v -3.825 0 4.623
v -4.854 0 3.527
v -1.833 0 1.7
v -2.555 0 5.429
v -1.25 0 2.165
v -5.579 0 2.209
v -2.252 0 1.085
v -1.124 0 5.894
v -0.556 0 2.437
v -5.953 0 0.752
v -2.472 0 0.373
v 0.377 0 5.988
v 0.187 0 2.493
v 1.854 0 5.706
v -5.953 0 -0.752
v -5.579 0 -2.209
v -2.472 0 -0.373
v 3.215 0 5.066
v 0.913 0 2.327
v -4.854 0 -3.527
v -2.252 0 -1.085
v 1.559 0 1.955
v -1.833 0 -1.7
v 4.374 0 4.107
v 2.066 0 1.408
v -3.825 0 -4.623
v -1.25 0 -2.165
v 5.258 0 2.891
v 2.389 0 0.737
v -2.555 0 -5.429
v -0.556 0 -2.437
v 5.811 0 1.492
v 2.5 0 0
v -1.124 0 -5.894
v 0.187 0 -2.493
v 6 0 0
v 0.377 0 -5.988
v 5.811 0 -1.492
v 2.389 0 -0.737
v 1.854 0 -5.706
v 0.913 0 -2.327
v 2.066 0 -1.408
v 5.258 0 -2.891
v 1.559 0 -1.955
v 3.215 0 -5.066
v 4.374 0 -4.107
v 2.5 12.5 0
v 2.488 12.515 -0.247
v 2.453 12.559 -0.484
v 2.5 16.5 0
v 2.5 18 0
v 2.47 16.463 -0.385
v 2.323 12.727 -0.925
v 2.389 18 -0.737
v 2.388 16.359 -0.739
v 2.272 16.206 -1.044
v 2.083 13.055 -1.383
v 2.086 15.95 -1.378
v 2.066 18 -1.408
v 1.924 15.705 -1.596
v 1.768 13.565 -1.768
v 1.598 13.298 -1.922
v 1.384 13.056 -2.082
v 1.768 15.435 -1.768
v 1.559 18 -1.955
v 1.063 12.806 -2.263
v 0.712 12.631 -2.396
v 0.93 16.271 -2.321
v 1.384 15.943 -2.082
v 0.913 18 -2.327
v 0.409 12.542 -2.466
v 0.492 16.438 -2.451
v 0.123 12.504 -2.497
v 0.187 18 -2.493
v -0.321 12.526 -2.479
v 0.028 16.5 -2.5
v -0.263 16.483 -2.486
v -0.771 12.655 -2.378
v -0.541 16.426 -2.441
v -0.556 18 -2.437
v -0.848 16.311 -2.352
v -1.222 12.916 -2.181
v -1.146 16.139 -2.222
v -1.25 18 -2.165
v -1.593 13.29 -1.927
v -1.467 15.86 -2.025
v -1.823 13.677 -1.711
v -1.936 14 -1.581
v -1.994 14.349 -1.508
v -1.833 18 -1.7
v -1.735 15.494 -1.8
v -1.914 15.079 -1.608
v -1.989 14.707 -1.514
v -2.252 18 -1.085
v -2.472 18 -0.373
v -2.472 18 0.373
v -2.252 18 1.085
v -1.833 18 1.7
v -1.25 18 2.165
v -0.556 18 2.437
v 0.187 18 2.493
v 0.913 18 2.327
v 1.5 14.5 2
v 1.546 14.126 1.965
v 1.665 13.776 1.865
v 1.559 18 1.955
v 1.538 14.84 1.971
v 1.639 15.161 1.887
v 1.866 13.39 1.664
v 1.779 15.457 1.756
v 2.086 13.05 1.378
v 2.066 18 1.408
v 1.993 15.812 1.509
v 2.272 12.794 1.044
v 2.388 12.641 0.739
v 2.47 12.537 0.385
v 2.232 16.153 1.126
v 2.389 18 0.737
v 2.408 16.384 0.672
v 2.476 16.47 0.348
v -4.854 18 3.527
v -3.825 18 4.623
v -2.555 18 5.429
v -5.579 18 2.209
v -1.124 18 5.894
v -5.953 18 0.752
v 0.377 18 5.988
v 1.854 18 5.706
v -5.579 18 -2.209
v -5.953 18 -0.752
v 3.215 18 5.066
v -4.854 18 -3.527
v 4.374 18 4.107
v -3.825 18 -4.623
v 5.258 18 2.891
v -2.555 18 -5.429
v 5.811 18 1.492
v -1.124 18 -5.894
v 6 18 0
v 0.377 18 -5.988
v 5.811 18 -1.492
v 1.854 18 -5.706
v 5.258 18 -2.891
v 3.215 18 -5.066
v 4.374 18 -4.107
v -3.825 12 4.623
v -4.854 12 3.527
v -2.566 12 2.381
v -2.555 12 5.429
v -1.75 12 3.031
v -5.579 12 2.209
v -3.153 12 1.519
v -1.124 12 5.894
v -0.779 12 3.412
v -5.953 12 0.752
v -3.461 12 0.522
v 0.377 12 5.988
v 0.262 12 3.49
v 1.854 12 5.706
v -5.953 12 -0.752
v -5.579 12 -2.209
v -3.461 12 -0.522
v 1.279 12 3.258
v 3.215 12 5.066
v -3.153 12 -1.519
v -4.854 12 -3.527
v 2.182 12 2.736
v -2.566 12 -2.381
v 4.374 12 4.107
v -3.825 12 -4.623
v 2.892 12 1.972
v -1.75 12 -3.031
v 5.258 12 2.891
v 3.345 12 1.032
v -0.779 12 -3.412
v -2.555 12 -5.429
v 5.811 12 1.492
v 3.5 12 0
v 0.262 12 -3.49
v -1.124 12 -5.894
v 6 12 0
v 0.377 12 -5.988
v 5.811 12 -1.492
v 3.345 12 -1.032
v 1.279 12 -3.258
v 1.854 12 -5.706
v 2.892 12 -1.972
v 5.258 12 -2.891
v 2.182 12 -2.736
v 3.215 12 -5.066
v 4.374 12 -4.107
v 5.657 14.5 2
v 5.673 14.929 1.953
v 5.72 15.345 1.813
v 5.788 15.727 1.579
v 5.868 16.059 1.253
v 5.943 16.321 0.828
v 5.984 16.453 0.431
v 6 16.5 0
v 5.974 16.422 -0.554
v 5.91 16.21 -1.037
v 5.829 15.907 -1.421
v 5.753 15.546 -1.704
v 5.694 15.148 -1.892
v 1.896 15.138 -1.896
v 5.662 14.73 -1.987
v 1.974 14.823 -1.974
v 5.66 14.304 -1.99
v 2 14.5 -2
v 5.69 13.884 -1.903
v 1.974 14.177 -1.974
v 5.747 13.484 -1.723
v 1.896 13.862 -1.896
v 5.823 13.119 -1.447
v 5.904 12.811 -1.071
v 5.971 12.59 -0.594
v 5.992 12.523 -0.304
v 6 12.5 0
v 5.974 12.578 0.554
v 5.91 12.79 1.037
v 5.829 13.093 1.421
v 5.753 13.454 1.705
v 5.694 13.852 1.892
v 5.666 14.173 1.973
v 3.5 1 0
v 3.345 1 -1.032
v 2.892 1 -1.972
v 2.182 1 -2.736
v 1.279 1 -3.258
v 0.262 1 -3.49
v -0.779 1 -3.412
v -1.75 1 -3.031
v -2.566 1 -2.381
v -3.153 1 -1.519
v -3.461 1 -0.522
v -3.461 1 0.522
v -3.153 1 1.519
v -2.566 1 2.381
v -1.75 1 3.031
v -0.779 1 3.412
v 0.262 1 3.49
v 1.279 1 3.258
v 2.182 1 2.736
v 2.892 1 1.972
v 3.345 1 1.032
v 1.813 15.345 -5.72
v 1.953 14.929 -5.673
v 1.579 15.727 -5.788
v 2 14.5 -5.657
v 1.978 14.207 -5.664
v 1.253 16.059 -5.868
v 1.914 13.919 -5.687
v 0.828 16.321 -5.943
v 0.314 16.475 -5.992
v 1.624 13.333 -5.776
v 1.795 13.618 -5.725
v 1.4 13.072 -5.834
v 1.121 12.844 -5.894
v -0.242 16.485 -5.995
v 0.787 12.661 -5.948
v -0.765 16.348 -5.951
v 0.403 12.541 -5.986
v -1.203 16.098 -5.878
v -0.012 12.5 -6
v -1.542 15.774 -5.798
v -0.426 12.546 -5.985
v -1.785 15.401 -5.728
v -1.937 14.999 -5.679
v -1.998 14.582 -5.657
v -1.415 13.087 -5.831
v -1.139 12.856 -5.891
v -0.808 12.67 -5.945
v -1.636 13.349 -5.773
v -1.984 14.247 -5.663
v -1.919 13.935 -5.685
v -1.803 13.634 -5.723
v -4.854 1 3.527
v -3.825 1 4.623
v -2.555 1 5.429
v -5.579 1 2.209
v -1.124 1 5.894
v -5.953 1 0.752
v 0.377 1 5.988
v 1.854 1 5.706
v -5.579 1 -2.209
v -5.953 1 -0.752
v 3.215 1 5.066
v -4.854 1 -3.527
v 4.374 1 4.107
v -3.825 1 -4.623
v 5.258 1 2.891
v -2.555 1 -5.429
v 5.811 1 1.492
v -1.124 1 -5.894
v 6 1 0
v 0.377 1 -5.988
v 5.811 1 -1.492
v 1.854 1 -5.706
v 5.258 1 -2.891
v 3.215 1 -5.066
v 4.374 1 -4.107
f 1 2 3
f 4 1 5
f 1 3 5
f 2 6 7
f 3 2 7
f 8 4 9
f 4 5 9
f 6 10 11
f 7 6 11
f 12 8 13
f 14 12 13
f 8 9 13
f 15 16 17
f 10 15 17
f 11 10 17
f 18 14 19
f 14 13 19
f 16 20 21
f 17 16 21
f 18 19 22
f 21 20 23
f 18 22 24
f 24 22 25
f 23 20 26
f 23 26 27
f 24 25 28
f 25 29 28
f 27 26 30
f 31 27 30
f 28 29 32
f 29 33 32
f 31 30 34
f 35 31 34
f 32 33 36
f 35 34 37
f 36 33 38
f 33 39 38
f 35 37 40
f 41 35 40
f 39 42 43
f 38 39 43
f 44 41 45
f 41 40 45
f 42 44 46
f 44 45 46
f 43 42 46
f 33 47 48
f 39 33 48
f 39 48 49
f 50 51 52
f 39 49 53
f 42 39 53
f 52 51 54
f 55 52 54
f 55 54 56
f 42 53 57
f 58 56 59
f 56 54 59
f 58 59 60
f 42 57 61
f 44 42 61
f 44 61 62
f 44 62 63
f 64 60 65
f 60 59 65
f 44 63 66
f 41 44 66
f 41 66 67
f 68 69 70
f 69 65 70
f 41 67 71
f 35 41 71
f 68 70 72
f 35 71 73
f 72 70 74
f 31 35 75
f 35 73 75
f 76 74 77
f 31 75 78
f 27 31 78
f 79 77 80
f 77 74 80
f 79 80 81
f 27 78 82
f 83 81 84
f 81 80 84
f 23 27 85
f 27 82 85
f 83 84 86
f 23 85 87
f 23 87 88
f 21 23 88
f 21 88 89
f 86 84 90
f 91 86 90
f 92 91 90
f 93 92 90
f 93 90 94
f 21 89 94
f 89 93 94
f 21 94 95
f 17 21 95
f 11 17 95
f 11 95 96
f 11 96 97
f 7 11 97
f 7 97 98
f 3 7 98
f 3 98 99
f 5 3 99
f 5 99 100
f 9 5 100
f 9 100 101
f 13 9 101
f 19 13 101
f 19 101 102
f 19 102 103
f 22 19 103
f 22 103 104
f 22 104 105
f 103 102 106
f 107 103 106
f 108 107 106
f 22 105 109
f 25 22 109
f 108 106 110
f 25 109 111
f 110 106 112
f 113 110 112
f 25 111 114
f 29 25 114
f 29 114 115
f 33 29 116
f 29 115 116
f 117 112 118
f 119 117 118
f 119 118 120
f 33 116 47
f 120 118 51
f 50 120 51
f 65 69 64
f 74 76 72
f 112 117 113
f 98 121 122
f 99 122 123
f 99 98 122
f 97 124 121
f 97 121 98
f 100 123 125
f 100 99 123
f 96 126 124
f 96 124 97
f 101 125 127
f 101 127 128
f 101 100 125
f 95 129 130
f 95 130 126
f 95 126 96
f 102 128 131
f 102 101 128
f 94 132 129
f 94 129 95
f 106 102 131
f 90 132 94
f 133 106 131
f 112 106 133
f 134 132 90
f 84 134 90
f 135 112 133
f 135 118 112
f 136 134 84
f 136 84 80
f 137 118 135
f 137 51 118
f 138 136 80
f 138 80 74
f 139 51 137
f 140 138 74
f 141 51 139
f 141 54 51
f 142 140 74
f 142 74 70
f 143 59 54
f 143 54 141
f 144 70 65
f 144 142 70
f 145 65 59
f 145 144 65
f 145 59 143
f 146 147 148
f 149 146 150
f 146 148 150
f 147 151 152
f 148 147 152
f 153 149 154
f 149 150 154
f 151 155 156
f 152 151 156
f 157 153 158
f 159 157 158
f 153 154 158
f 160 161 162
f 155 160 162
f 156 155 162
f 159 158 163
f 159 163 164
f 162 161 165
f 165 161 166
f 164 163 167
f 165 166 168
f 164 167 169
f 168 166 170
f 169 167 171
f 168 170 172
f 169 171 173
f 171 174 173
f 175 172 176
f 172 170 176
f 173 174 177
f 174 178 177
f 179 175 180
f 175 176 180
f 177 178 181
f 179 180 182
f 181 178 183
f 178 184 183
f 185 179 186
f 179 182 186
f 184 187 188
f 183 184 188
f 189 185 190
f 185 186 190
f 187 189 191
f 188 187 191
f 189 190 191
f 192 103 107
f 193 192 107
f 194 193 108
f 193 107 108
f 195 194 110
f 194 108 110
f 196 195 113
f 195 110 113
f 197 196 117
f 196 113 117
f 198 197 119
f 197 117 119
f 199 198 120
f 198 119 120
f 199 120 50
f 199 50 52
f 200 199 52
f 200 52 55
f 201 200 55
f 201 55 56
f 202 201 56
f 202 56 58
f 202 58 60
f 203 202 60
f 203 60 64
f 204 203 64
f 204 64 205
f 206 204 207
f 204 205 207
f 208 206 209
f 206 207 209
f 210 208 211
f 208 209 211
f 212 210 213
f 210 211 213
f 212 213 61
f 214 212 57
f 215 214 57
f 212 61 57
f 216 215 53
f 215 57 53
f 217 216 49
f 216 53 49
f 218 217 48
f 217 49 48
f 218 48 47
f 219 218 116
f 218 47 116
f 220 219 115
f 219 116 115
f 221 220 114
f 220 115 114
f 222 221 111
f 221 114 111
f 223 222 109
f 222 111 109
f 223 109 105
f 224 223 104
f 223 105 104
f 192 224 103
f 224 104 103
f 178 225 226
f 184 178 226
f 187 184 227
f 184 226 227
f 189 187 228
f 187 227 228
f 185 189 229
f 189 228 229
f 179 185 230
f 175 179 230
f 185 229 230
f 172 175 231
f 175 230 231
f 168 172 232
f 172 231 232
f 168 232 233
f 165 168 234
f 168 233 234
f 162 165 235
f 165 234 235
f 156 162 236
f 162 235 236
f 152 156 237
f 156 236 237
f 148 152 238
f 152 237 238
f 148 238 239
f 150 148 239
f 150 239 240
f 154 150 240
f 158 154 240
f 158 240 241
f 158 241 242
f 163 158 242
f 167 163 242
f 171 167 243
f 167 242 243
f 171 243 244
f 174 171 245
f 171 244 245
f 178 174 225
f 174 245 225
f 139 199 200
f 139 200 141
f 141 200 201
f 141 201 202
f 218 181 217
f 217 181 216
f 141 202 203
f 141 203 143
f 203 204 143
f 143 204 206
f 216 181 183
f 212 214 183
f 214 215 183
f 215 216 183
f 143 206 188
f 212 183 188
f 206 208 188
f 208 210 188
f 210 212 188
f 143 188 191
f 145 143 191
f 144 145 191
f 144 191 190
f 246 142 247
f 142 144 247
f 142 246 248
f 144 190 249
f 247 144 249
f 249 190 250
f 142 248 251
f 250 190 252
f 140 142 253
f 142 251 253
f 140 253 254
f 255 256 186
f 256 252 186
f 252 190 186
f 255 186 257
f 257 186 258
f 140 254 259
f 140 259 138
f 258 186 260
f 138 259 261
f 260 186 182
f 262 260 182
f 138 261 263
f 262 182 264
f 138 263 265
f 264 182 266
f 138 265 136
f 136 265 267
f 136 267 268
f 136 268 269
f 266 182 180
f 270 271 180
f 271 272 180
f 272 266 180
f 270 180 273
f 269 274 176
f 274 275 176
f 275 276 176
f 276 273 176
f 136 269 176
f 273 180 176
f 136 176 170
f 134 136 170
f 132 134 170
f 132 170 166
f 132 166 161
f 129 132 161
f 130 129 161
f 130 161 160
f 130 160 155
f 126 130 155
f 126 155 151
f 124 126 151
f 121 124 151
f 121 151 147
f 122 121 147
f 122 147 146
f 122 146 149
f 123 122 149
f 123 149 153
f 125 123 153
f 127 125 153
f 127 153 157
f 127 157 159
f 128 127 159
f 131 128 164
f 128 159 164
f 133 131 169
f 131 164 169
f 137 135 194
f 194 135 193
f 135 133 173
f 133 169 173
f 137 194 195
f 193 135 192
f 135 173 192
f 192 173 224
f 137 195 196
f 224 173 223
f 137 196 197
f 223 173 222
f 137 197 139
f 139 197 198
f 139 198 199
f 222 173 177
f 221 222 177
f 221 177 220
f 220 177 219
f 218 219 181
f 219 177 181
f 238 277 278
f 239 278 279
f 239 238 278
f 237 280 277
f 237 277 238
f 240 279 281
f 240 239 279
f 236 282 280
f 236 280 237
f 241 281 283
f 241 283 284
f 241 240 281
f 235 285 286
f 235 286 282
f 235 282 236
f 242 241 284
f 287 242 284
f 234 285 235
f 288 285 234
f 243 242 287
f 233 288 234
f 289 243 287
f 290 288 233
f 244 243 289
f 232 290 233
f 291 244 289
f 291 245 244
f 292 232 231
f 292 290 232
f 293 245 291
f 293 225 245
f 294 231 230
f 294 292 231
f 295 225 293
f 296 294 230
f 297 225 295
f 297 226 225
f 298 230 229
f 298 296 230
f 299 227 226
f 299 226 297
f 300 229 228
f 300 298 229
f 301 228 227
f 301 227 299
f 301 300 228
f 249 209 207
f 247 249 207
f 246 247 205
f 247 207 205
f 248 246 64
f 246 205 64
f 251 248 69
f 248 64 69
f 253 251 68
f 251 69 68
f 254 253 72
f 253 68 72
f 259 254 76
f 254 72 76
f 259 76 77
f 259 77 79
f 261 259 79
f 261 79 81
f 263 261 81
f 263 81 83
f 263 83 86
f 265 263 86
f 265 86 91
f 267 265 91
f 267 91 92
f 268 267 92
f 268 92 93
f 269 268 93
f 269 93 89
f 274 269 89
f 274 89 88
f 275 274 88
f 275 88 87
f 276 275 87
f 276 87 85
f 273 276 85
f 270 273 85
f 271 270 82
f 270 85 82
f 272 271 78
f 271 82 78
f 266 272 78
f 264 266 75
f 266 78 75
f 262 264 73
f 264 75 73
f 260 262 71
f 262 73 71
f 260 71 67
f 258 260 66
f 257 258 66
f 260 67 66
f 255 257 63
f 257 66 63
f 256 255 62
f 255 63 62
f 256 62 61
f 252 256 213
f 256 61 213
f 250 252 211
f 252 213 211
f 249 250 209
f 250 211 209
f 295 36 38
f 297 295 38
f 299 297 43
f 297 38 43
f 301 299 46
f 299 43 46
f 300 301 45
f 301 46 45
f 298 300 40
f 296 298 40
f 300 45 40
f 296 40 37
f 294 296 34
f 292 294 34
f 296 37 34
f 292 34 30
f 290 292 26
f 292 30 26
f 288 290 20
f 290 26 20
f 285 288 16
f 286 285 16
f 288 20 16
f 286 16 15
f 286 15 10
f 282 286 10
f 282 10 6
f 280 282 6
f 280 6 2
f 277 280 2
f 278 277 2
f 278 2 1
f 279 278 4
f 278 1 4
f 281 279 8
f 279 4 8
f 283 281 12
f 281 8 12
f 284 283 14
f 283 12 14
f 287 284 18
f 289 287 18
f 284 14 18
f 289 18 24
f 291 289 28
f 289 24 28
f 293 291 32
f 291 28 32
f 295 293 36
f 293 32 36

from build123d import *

# Parameters (mm, degrees)
SKETCH1_R           = 6
BOSS_EXTRUDE1_DEPTH = 1
SKETCH2_R           = 3.5
BOSS_EXTRUDE2_DEPTH = 11
SKETCH3_R           = 6
BOSS_EXTRUDE3_DEPTH = 2
SKETCH4_R           = 6
BOSS_EXTRUDE4_DEPTH = 4
SKETCH5_R           = 2.5
CUT_EXTRUDE1_DEPTH  = 19
SKETCH6_R           = 2
CUT_EXTRUDE2_DEPTH  = 7
CIRPATTERN1_COUNT   = 2
CIRPATTERN1_ANGLE   = 90


with BuildPart() as part:
    # Sketch1 → Boss-Extrude1 (new body)
    with BuildSketch(Plane(origin=(0, 0, 0), x_dir=(1, 0, 0), z_dir=(0, 1, 0))):
        Circle(SKETCH1_R)
    extrude(amount=BOSS_EXTRUDE1_DEPTH)

    # Sketch2 → Boss-Extrude2 (add)
    with BuildSketch(Plane(origin=(0, 1, 0), x_dir=(1, 0, 0), z_dir=(0, 1, 0))):
        Circle(SKETCH2_R)
    extrude(amount=BOSS_EXTRUDE2_DEPTH)

    # Sketch3 → Boss-Extrude3 (add)
    with BuildSketch(Plane(origin=(0, 12, 0), x_dir=(1, 0, 0), z_dir=(0, 1, 0))):
        Circle(SKETCH3_R)
    extrude(amount=BOSS_EXTRUDE3_DEPTH)

    # Sketch4 → Boss-Extrude4 (add)
    with BuildSketch(Plane(origin=(0, 14, 0), x_dir=(1, 0, 0), z_dir=(0, 1, 0))):
        Circle(SKETCH4_R)
    extrude(amount=BOSS_EXTRUDE4_DEPTH)

    # Sketch5 → Cut-Extrude1 (cut, through all)
    with BuildSketch(Plane(origin=(0, 18, 0), x_dir=(1, 0, 0), z_dir=(0, 1, 0))):
        Circle(SKETCH5_R)
    extrude(amount=-CUT_EXTRUDE1_DEPTH, mode=Mode.SUBTRACT)

    # Sketch6 → Cut-Extrude2 (cut, through all)
    with BuildSketch(Plane.XY):
        with Locations((0, 14.5)):
            Circle(SKETCH6_R)
    cut_extrude2 = extrude(amount=-CUT_EXTRUDE2_DEPTH, mode=Mode.SUBTRACT)

    # CirPattern1: Cut-Extrude2 ×2 about axis
    cirpattern1_axis = Axis((0, 14, 0), (0, -1, 0))
    for i in range(1, CIRPATTERN1_COUNT):
        add(cut_extrude2.rotate(cirpattern1_axis, i * CIRPATTERN1_ANGLE / (CIRPATTERN1_COUNT - 1)), mode=Mode.SUBTRACT)


solid = part.part
